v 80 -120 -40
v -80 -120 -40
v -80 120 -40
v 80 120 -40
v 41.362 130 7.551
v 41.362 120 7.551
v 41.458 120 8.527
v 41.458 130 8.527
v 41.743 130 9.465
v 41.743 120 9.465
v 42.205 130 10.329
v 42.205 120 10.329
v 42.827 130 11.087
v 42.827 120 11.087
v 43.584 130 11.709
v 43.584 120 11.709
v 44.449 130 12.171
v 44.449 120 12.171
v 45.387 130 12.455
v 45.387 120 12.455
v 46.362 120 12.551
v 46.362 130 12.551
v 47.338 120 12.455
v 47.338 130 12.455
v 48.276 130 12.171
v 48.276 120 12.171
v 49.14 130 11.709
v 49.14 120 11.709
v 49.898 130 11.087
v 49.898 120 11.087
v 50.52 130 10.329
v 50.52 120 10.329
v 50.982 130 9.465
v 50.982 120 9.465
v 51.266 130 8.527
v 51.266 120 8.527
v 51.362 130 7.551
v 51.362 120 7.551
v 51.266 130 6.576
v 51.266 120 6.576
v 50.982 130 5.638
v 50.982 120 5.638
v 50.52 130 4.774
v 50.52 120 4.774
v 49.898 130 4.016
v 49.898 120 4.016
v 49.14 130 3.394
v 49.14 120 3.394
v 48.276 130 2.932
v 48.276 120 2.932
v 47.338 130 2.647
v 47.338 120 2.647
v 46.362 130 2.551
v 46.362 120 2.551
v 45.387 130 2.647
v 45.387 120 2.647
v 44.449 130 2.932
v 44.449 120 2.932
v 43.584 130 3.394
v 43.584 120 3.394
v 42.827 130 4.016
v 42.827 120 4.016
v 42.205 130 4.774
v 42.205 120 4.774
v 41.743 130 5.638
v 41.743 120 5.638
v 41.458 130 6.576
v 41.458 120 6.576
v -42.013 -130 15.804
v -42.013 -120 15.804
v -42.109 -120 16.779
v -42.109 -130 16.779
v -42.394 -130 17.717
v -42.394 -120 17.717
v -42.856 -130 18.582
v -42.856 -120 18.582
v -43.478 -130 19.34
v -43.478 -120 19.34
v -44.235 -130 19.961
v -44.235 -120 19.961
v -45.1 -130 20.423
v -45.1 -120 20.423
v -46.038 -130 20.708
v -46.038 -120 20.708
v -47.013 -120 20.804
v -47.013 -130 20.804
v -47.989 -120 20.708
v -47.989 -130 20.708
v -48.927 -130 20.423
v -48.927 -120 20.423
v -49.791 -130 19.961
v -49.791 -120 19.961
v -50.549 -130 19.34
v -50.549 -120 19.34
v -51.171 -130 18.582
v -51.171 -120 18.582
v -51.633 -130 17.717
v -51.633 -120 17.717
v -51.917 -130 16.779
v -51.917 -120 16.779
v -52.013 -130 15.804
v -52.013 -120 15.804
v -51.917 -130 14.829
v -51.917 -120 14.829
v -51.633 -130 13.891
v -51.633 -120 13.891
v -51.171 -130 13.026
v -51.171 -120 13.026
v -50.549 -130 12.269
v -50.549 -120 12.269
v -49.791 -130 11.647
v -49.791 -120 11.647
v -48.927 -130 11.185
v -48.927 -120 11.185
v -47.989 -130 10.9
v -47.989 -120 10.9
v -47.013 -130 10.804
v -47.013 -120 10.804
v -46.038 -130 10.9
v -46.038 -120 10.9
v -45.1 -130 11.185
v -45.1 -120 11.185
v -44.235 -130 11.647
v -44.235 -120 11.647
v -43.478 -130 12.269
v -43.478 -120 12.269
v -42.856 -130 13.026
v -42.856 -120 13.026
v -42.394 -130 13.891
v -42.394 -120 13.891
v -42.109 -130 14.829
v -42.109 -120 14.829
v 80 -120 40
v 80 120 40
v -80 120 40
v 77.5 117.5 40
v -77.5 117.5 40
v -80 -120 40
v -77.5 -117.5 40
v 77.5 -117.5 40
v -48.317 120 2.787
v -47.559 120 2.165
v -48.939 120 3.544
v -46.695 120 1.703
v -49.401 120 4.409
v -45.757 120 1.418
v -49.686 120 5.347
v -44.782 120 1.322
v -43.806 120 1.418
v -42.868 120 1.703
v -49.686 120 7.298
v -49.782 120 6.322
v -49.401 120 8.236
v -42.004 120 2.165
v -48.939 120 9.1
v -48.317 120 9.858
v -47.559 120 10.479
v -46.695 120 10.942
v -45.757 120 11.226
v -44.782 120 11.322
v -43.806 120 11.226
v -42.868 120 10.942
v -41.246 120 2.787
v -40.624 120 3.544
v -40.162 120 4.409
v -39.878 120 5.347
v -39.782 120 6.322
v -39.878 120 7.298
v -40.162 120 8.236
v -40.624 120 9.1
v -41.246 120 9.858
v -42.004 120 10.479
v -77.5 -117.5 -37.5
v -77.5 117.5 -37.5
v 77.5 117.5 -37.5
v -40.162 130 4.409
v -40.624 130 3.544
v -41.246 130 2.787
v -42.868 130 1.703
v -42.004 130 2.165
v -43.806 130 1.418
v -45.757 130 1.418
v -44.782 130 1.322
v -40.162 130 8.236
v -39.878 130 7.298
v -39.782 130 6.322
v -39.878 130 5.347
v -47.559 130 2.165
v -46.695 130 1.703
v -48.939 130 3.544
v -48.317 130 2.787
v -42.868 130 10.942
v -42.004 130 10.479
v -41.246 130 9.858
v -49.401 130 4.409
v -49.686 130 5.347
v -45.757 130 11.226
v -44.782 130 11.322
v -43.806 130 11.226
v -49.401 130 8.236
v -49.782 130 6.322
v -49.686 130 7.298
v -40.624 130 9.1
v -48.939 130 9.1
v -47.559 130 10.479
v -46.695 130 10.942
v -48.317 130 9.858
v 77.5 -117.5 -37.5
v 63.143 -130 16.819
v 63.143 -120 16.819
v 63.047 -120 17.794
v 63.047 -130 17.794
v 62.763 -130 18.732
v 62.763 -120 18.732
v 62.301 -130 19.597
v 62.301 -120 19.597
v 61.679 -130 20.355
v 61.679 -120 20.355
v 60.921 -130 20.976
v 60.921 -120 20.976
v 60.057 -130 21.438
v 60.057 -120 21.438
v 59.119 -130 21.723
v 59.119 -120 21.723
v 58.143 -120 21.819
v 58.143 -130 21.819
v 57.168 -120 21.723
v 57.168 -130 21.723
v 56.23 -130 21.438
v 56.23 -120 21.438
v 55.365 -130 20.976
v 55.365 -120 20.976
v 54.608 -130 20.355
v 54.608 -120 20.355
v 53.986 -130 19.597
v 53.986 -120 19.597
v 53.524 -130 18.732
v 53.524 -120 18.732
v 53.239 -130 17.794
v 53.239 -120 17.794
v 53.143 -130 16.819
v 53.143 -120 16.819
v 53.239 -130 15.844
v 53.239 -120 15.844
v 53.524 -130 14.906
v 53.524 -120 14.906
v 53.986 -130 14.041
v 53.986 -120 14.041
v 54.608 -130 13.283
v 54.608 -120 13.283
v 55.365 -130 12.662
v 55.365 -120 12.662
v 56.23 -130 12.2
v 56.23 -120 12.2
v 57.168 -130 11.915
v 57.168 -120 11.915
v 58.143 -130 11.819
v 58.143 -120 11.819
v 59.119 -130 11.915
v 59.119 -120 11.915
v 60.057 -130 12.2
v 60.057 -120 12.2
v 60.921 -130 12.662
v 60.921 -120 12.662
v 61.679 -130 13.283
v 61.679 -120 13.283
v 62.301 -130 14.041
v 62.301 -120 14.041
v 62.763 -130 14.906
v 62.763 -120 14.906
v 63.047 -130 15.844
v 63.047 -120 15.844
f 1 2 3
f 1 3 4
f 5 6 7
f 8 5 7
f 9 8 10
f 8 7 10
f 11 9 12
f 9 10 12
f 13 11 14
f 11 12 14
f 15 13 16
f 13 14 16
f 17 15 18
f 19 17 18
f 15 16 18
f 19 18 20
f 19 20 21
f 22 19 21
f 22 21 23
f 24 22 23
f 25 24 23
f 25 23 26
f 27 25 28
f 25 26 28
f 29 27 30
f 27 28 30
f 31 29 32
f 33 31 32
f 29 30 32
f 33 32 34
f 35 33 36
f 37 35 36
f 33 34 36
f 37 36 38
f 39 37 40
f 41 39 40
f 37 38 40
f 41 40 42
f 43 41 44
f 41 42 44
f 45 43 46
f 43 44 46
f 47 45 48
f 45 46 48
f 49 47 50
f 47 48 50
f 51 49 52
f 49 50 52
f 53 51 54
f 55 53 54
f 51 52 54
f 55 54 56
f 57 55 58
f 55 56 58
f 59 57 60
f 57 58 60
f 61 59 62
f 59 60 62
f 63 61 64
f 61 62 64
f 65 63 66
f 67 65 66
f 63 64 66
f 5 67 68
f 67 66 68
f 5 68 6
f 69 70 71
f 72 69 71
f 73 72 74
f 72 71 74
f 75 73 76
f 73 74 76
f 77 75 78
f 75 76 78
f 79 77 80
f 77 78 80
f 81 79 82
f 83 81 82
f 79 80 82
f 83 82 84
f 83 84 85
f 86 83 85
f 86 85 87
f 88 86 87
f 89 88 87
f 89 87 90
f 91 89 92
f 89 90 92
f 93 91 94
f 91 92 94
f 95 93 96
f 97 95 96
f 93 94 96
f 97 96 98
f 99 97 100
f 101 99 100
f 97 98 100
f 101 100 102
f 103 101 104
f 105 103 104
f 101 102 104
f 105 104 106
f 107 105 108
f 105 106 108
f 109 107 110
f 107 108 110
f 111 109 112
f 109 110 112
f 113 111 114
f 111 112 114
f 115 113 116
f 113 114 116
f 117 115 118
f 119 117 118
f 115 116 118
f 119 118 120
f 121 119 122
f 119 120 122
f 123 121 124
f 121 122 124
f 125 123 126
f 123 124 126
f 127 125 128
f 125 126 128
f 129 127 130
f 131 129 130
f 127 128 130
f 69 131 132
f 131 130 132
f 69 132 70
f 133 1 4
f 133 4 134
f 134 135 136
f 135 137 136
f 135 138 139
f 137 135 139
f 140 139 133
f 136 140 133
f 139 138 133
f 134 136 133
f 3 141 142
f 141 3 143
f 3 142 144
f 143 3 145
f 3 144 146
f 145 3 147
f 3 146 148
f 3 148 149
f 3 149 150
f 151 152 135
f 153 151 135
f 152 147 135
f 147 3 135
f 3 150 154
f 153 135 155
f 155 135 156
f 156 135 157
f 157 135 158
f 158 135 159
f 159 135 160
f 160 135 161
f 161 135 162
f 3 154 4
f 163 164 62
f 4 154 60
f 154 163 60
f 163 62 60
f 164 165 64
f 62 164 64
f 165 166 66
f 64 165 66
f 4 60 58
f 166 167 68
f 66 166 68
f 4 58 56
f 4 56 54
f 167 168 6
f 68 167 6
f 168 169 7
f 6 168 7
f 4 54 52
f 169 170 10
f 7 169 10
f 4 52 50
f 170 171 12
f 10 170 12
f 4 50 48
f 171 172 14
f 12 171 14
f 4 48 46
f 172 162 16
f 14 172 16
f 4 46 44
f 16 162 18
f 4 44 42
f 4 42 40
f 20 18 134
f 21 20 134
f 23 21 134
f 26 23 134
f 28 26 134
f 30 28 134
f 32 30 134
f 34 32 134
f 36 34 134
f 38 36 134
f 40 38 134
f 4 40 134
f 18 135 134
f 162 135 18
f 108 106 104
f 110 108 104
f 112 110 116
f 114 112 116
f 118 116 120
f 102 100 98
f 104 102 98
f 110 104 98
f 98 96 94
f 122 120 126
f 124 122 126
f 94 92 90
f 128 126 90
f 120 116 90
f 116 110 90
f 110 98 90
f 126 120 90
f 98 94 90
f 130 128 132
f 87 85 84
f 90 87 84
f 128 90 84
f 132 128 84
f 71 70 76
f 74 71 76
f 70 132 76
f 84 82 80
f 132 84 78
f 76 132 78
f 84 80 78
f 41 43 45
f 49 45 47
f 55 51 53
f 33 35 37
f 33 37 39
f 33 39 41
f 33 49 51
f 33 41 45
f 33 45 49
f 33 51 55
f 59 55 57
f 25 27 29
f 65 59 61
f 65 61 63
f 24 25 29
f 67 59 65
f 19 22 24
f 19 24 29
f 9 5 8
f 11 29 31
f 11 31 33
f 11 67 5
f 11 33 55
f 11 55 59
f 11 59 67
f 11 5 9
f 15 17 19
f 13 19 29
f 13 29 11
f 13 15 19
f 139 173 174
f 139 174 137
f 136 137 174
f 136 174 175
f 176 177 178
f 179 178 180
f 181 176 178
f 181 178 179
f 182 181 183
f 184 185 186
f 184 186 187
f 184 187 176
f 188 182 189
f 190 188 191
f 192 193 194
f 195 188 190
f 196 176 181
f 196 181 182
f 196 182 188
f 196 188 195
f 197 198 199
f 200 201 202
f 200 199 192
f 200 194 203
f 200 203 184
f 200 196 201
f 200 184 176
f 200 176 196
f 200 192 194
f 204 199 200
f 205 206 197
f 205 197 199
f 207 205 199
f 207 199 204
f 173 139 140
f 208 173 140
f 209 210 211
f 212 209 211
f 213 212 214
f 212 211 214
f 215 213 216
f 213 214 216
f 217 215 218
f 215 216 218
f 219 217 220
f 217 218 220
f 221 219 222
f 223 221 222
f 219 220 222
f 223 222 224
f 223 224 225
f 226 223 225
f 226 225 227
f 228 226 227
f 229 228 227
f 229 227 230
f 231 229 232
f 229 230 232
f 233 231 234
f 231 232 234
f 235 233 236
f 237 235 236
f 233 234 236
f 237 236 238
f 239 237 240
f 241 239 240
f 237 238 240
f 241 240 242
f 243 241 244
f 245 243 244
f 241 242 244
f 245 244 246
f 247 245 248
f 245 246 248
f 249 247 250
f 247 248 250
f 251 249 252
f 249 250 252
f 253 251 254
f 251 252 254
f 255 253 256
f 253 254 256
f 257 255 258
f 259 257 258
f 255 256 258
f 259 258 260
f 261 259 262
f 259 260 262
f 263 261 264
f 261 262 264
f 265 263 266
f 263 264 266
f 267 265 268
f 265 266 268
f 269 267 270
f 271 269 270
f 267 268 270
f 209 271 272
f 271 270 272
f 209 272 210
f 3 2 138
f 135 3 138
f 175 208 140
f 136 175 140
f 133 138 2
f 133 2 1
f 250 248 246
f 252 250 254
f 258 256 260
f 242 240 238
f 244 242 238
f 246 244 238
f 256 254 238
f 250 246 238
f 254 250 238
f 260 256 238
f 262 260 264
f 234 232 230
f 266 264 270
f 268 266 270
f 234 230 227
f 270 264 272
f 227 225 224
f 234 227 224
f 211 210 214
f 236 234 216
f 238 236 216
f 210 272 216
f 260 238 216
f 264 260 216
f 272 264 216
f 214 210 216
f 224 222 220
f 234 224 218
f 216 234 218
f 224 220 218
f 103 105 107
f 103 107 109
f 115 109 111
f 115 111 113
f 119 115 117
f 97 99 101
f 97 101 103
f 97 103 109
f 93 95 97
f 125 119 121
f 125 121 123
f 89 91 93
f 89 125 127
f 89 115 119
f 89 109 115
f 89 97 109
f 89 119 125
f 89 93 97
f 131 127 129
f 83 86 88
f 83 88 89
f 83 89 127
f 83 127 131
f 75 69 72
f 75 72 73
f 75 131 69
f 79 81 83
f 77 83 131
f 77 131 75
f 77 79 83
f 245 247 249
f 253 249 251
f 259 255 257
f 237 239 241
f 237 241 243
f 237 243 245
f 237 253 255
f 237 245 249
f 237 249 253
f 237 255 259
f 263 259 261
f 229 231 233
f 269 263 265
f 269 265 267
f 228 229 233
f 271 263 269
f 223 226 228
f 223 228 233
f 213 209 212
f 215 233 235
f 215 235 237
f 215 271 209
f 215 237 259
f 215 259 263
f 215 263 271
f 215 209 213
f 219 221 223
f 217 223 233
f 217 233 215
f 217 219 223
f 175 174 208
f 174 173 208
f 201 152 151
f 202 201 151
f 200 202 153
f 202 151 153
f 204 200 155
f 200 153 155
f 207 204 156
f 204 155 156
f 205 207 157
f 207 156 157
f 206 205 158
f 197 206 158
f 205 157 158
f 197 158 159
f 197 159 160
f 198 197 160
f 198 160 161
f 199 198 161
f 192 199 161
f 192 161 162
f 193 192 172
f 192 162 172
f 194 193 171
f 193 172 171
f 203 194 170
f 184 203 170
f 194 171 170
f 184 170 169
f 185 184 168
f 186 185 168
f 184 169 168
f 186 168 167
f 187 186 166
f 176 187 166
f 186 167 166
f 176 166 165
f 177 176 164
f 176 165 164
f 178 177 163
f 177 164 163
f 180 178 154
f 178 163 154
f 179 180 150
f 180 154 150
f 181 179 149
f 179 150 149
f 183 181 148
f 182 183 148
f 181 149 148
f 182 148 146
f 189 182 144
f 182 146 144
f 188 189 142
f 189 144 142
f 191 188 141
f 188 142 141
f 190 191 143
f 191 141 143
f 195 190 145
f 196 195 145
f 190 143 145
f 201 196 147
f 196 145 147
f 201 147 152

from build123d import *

# Parameters (mm, degrees)
F1_W      = 160
F1_H      = 80
F2_DEPTH  = 120
F5_T      = -2.5
F7_R      = 5
F9_DEPTH  = 10
F11_R     = 5
F12_DEPTH = 10


# Not quite as in the source:
# - the program builds the solid bodies; features that only make, move or delete a surface that nothing else refers to are left out


with BuildPart() as f2:
    # F1 (on face) → F2 (new body, symmetric)
    with BuildSketch(Plane.XZ):
        Rectangle(F1_W, F1_H)
    extrude(amount=F2_DEPTH, both=True)

    # F5
    f5_openings = [f2.faces().sort_by_distance(p)[0] for p in [
        (0, 0, 40),
    ]]
    offset(amount=F5_T, openings=f5_openings)

    # F11 (on face) → F12 (join)
    with BuildSketch(Plane(origin=(0, 120, 0), x_dir=(-1, 0, 0), z_dir=(0, 1, 0))):
        with Locations((-46.3621765375, 7.5514214113)):
            Circle(F11_R)
        with Locations((44.7815805674, 6.3221203163)):
            Circle(F11_R)
    extrude(amount=F12_DEPTH)


with BuildPart() as f9:
    # F7 (on face) → F9 (new body)
    with BuildSketch(Plane.XZ.offset(120)):
        with Locations((-47.0132157207, 15.8040374517)):
            Circle(F7_R)
    extrude(amount=F9_DEPTH)


with BuildPart() as f9b:
    # F7 (on face) → F9, piece 2 (new body)
    with BuildSketch(Plane.XZ.offset(120)):
        with Locations((58.1432282925, 16.818979755)):
            Circle(F7_R)
    extrude(amount=F9_DEPTH)


solid = Compound([f2.part, f9.part, f9b.part])
